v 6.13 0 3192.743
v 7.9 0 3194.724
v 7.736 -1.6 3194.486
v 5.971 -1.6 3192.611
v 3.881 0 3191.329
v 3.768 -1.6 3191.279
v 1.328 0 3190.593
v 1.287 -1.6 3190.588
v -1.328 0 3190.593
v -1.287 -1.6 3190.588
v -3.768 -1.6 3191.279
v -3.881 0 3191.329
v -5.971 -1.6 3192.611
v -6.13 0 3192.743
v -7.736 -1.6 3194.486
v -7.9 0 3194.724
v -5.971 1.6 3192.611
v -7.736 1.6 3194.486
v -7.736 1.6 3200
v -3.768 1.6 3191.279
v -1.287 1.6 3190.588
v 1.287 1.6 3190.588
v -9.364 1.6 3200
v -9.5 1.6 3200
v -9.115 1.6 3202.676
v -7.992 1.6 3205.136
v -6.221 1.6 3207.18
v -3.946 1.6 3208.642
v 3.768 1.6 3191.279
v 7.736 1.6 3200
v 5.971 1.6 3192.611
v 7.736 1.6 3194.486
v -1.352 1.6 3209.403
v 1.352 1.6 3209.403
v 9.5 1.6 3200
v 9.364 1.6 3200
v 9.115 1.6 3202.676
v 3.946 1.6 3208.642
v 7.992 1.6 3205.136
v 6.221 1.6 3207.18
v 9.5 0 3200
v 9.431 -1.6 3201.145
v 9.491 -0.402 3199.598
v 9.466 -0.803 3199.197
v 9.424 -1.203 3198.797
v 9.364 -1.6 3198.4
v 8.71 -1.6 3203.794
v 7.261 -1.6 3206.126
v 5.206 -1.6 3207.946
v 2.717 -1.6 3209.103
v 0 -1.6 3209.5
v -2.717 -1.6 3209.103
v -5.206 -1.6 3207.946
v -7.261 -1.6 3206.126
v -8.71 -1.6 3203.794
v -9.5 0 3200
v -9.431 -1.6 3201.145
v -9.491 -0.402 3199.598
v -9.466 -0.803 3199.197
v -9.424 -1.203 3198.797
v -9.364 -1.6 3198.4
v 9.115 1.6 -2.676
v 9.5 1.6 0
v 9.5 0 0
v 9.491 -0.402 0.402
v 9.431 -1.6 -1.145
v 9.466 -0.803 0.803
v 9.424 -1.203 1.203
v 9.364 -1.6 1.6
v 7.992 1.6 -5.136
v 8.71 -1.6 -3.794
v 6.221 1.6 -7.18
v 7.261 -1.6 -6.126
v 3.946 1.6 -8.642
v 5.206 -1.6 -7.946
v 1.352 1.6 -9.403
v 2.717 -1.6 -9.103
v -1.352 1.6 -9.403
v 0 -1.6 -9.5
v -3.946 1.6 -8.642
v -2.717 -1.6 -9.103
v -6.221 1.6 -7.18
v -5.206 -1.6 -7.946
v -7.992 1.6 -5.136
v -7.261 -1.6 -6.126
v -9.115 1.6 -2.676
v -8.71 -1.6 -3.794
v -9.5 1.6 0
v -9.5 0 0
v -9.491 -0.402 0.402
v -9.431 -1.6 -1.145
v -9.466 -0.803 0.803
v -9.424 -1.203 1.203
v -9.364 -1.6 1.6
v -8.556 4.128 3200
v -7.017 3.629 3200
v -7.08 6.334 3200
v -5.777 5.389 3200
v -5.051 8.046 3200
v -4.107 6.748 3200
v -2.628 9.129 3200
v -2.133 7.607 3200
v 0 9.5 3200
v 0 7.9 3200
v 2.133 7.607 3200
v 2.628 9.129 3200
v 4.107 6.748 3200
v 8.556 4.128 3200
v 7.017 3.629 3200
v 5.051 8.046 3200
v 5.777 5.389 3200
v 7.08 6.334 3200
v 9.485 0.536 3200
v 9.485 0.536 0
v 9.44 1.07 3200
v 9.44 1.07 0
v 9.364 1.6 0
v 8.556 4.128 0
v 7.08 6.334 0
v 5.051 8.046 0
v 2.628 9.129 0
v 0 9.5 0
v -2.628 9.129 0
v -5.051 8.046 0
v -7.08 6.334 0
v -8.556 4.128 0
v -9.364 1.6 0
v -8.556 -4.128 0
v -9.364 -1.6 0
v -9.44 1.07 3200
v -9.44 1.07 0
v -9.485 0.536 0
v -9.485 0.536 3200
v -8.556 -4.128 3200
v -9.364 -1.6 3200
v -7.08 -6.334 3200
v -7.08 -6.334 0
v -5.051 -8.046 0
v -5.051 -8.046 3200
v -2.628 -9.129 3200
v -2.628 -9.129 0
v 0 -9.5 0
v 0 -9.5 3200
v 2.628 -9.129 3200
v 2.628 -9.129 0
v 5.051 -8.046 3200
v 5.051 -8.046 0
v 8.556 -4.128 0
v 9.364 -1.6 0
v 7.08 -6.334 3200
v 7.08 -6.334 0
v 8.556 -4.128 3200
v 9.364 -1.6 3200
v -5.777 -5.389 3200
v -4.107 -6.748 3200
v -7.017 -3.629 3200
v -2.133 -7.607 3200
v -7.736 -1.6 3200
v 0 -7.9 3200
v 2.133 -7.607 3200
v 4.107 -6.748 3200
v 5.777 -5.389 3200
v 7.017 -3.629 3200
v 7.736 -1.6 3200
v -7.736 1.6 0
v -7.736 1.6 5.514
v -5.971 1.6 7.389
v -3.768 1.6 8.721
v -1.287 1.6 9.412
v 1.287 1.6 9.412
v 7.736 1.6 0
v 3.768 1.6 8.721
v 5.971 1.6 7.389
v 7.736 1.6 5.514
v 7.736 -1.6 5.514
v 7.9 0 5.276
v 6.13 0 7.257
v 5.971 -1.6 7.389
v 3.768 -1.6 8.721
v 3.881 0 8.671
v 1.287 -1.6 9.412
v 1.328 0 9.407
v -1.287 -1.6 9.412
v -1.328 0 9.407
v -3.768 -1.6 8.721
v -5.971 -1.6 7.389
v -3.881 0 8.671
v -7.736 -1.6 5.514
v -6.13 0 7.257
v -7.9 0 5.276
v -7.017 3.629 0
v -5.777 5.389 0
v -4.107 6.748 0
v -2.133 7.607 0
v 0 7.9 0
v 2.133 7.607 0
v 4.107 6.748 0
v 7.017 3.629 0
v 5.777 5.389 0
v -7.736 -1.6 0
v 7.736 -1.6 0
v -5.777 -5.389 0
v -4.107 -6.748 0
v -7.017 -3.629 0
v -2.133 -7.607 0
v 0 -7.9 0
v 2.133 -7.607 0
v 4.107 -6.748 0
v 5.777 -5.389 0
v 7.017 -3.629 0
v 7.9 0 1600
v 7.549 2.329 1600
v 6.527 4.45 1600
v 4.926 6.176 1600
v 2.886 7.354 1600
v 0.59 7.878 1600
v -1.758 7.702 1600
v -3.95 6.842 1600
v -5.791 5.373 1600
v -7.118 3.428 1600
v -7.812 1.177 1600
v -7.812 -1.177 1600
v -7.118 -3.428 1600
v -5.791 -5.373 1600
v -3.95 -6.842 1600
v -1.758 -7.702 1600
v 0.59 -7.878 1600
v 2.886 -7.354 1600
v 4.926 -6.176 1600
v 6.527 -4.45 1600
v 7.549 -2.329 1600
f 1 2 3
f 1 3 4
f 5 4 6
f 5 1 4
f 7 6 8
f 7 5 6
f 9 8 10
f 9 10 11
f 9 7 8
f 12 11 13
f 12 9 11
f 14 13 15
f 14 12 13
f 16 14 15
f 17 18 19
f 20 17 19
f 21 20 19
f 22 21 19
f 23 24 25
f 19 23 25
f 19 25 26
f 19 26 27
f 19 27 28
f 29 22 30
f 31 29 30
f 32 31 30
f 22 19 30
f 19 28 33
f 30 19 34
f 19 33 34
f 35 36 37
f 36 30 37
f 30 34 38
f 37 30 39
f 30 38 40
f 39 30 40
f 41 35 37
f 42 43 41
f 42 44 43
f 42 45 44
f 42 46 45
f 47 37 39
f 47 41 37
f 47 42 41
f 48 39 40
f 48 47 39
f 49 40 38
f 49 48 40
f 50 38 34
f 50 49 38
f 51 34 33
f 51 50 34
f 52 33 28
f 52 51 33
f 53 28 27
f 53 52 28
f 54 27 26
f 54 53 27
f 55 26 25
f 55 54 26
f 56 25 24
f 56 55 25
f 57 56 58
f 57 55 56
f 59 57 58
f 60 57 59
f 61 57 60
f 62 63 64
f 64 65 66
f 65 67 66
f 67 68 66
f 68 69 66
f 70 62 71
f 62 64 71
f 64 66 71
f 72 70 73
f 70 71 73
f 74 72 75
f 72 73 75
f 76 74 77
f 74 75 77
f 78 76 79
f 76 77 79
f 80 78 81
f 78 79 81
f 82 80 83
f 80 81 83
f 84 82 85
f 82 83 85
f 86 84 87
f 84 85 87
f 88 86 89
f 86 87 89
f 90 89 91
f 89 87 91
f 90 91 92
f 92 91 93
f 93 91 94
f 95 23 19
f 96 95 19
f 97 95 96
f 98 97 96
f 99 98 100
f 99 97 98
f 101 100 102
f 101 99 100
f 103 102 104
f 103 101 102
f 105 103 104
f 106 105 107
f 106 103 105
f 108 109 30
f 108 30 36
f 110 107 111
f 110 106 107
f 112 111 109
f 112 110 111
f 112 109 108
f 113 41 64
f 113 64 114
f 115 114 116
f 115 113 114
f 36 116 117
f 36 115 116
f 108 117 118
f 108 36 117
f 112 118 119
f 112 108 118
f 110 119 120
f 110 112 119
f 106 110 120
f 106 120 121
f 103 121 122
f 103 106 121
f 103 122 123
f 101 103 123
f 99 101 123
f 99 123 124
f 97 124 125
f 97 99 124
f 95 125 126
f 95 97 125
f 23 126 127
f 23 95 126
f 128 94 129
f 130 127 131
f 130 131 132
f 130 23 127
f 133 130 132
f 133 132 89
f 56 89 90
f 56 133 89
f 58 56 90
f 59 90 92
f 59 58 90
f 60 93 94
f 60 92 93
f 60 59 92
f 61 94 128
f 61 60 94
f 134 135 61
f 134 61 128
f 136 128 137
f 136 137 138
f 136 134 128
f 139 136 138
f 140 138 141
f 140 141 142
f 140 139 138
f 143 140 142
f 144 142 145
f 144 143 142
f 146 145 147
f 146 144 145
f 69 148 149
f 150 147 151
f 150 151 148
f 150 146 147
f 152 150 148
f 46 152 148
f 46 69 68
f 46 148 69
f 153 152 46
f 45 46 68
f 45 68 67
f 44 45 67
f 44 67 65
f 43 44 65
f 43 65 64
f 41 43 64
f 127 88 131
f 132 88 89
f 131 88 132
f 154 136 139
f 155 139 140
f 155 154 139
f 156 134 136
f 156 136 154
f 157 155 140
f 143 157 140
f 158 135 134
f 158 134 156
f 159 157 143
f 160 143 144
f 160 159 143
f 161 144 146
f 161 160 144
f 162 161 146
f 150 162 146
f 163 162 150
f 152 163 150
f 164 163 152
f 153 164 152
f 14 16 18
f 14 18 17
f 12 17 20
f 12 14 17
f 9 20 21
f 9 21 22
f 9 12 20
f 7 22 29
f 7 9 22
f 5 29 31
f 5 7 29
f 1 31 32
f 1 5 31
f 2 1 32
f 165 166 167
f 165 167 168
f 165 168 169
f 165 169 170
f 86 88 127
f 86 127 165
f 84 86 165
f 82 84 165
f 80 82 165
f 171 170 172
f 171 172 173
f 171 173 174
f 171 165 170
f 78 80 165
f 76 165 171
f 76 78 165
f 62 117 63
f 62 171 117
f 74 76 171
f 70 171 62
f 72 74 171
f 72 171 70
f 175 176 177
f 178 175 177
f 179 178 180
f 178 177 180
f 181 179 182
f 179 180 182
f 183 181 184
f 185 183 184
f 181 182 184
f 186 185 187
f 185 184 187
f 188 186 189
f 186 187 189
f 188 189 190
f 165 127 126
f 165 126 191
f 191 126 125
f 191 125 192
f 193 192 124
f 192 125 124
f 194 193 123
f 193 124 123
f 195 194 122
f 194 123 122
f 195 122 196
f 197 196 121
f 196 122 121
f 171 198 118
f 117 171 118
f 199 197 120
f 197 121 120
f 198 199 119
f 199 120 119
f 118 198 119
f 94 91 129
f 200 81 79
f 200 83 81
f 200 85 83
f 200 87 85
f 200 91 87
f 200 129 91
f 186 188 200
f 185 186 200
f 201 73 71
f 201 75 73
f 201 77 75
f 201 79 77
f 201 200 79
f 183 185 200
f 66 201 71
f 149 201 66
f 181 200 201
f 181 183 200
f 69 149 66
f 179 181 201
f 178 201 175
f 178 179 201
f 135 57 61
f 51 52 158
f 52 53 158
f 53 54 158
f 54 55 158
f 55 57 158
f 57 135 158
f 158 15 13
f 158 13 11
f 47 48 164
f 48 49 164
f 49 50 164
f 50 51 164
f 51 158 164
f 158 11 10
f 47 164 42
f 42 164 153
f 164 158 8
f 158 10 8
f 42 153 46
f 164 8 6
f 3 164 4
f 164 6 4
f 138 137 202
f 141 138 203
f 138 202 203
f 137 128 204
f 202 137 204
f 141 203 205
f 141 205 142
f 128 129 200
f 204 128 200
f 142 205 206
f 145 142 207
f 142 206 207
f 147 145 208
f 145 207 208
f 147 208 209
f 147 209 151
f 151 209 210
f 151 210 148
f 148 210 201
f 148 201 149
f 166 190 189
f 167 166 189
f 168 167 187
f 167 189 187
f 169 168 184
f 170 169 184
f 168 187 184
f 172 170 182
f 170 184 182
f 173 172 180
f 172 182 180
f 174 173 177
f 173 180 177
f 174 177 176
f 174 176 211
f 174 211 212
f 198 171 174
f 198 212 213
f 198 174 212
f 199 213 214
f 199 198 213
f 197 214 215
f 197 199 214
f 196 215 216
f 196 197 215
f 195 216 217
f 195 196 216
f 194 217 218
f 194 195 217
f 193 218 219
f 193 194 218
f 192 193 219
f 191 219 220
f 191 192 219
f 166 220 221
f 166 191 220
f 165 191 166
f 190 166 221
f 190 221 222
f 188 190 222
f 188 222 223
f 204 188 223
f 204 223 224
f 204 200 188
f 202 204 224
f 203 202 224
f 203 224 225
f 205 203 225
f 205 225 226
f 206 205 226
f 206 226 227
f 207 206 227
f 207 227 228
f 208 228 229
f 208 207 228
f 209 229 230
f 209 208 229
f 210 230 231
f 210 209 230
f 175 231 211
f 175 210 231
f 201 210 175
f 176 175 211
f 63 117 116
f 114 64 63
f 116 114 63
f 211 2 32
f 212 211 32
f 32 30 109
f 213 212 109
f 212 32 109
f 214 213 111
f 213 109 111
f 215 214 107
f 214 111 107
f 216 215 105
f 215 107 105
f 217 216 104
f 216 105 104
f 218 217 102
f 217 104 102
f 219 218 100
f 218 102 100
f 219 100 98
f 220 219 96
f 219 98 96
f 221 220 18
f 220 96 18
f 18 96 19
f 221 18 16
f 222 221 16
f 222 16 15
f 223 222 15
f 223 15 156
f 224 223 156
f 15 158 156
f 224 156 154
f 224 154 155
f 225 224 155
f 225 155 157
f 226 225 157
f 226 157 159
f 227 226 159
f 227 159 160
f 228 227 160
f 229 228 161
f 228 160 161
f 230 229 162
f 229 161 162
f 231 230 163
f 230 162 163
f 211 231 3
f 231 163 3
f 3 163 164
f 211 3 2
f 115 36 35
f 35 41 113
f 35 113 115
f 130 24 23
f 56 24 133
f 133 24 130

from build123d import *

# Parameters (mm, degrees)
F0_R     = 9.5
F0_R_2   = 7.9
F1_DEPTH = 1600
F2_R     = 9.5
F3_DEPTH = 1.6
F4_DEPTH = 1.6


with BuildPart() as f1:
    # F0 (on Top) → F1 (new body)
    with BuildSketch(Plane.XY):
        Circle(F0_R)
        Circle(F0_R_2, mode=Mode.SUBTRACT)
    extrude(amount=F1_DEPTH)

    # F2 (on Front) → F3 (join)
    with BuildSketch(Plane.XZ):
        Circle(F2_R)
    extrude(amount=F3_DEPTH)

    # F3_face (on face) → F4 (join)
    with BuildSketch(Plane(origin=(0, 0, -0.084371), x_dir=(1, 0, 0), z_dir=(0, 1, 0))):
        with BuildLine():
            ThreePointArc((9.5, -0.084371), (0, 9.415629), (-9.5, -0.084371))
            Line((-9.5, -0.084371), (-7.9, -0.084371))
            Line((-7.9, -0.084371), (-7.9, -5.360733))
            ThreePointArc((-7.9, -5.360733), (0, -9.584371), (7.9, -5.360733))
            Line((7.9, -5.360733), (7.9, -0.084371))
            Line((7.9, -0.084371), (9.5, -0.084371))
        make_face()
    extrude(amount=F4_DEPTH)

    # F5: F1 across face


with BuildPart() as f1_1:
    add(f1.part)
    add(f1.part.mirror(Plane.XY.offset(1600)))


solid = f1_1.part
